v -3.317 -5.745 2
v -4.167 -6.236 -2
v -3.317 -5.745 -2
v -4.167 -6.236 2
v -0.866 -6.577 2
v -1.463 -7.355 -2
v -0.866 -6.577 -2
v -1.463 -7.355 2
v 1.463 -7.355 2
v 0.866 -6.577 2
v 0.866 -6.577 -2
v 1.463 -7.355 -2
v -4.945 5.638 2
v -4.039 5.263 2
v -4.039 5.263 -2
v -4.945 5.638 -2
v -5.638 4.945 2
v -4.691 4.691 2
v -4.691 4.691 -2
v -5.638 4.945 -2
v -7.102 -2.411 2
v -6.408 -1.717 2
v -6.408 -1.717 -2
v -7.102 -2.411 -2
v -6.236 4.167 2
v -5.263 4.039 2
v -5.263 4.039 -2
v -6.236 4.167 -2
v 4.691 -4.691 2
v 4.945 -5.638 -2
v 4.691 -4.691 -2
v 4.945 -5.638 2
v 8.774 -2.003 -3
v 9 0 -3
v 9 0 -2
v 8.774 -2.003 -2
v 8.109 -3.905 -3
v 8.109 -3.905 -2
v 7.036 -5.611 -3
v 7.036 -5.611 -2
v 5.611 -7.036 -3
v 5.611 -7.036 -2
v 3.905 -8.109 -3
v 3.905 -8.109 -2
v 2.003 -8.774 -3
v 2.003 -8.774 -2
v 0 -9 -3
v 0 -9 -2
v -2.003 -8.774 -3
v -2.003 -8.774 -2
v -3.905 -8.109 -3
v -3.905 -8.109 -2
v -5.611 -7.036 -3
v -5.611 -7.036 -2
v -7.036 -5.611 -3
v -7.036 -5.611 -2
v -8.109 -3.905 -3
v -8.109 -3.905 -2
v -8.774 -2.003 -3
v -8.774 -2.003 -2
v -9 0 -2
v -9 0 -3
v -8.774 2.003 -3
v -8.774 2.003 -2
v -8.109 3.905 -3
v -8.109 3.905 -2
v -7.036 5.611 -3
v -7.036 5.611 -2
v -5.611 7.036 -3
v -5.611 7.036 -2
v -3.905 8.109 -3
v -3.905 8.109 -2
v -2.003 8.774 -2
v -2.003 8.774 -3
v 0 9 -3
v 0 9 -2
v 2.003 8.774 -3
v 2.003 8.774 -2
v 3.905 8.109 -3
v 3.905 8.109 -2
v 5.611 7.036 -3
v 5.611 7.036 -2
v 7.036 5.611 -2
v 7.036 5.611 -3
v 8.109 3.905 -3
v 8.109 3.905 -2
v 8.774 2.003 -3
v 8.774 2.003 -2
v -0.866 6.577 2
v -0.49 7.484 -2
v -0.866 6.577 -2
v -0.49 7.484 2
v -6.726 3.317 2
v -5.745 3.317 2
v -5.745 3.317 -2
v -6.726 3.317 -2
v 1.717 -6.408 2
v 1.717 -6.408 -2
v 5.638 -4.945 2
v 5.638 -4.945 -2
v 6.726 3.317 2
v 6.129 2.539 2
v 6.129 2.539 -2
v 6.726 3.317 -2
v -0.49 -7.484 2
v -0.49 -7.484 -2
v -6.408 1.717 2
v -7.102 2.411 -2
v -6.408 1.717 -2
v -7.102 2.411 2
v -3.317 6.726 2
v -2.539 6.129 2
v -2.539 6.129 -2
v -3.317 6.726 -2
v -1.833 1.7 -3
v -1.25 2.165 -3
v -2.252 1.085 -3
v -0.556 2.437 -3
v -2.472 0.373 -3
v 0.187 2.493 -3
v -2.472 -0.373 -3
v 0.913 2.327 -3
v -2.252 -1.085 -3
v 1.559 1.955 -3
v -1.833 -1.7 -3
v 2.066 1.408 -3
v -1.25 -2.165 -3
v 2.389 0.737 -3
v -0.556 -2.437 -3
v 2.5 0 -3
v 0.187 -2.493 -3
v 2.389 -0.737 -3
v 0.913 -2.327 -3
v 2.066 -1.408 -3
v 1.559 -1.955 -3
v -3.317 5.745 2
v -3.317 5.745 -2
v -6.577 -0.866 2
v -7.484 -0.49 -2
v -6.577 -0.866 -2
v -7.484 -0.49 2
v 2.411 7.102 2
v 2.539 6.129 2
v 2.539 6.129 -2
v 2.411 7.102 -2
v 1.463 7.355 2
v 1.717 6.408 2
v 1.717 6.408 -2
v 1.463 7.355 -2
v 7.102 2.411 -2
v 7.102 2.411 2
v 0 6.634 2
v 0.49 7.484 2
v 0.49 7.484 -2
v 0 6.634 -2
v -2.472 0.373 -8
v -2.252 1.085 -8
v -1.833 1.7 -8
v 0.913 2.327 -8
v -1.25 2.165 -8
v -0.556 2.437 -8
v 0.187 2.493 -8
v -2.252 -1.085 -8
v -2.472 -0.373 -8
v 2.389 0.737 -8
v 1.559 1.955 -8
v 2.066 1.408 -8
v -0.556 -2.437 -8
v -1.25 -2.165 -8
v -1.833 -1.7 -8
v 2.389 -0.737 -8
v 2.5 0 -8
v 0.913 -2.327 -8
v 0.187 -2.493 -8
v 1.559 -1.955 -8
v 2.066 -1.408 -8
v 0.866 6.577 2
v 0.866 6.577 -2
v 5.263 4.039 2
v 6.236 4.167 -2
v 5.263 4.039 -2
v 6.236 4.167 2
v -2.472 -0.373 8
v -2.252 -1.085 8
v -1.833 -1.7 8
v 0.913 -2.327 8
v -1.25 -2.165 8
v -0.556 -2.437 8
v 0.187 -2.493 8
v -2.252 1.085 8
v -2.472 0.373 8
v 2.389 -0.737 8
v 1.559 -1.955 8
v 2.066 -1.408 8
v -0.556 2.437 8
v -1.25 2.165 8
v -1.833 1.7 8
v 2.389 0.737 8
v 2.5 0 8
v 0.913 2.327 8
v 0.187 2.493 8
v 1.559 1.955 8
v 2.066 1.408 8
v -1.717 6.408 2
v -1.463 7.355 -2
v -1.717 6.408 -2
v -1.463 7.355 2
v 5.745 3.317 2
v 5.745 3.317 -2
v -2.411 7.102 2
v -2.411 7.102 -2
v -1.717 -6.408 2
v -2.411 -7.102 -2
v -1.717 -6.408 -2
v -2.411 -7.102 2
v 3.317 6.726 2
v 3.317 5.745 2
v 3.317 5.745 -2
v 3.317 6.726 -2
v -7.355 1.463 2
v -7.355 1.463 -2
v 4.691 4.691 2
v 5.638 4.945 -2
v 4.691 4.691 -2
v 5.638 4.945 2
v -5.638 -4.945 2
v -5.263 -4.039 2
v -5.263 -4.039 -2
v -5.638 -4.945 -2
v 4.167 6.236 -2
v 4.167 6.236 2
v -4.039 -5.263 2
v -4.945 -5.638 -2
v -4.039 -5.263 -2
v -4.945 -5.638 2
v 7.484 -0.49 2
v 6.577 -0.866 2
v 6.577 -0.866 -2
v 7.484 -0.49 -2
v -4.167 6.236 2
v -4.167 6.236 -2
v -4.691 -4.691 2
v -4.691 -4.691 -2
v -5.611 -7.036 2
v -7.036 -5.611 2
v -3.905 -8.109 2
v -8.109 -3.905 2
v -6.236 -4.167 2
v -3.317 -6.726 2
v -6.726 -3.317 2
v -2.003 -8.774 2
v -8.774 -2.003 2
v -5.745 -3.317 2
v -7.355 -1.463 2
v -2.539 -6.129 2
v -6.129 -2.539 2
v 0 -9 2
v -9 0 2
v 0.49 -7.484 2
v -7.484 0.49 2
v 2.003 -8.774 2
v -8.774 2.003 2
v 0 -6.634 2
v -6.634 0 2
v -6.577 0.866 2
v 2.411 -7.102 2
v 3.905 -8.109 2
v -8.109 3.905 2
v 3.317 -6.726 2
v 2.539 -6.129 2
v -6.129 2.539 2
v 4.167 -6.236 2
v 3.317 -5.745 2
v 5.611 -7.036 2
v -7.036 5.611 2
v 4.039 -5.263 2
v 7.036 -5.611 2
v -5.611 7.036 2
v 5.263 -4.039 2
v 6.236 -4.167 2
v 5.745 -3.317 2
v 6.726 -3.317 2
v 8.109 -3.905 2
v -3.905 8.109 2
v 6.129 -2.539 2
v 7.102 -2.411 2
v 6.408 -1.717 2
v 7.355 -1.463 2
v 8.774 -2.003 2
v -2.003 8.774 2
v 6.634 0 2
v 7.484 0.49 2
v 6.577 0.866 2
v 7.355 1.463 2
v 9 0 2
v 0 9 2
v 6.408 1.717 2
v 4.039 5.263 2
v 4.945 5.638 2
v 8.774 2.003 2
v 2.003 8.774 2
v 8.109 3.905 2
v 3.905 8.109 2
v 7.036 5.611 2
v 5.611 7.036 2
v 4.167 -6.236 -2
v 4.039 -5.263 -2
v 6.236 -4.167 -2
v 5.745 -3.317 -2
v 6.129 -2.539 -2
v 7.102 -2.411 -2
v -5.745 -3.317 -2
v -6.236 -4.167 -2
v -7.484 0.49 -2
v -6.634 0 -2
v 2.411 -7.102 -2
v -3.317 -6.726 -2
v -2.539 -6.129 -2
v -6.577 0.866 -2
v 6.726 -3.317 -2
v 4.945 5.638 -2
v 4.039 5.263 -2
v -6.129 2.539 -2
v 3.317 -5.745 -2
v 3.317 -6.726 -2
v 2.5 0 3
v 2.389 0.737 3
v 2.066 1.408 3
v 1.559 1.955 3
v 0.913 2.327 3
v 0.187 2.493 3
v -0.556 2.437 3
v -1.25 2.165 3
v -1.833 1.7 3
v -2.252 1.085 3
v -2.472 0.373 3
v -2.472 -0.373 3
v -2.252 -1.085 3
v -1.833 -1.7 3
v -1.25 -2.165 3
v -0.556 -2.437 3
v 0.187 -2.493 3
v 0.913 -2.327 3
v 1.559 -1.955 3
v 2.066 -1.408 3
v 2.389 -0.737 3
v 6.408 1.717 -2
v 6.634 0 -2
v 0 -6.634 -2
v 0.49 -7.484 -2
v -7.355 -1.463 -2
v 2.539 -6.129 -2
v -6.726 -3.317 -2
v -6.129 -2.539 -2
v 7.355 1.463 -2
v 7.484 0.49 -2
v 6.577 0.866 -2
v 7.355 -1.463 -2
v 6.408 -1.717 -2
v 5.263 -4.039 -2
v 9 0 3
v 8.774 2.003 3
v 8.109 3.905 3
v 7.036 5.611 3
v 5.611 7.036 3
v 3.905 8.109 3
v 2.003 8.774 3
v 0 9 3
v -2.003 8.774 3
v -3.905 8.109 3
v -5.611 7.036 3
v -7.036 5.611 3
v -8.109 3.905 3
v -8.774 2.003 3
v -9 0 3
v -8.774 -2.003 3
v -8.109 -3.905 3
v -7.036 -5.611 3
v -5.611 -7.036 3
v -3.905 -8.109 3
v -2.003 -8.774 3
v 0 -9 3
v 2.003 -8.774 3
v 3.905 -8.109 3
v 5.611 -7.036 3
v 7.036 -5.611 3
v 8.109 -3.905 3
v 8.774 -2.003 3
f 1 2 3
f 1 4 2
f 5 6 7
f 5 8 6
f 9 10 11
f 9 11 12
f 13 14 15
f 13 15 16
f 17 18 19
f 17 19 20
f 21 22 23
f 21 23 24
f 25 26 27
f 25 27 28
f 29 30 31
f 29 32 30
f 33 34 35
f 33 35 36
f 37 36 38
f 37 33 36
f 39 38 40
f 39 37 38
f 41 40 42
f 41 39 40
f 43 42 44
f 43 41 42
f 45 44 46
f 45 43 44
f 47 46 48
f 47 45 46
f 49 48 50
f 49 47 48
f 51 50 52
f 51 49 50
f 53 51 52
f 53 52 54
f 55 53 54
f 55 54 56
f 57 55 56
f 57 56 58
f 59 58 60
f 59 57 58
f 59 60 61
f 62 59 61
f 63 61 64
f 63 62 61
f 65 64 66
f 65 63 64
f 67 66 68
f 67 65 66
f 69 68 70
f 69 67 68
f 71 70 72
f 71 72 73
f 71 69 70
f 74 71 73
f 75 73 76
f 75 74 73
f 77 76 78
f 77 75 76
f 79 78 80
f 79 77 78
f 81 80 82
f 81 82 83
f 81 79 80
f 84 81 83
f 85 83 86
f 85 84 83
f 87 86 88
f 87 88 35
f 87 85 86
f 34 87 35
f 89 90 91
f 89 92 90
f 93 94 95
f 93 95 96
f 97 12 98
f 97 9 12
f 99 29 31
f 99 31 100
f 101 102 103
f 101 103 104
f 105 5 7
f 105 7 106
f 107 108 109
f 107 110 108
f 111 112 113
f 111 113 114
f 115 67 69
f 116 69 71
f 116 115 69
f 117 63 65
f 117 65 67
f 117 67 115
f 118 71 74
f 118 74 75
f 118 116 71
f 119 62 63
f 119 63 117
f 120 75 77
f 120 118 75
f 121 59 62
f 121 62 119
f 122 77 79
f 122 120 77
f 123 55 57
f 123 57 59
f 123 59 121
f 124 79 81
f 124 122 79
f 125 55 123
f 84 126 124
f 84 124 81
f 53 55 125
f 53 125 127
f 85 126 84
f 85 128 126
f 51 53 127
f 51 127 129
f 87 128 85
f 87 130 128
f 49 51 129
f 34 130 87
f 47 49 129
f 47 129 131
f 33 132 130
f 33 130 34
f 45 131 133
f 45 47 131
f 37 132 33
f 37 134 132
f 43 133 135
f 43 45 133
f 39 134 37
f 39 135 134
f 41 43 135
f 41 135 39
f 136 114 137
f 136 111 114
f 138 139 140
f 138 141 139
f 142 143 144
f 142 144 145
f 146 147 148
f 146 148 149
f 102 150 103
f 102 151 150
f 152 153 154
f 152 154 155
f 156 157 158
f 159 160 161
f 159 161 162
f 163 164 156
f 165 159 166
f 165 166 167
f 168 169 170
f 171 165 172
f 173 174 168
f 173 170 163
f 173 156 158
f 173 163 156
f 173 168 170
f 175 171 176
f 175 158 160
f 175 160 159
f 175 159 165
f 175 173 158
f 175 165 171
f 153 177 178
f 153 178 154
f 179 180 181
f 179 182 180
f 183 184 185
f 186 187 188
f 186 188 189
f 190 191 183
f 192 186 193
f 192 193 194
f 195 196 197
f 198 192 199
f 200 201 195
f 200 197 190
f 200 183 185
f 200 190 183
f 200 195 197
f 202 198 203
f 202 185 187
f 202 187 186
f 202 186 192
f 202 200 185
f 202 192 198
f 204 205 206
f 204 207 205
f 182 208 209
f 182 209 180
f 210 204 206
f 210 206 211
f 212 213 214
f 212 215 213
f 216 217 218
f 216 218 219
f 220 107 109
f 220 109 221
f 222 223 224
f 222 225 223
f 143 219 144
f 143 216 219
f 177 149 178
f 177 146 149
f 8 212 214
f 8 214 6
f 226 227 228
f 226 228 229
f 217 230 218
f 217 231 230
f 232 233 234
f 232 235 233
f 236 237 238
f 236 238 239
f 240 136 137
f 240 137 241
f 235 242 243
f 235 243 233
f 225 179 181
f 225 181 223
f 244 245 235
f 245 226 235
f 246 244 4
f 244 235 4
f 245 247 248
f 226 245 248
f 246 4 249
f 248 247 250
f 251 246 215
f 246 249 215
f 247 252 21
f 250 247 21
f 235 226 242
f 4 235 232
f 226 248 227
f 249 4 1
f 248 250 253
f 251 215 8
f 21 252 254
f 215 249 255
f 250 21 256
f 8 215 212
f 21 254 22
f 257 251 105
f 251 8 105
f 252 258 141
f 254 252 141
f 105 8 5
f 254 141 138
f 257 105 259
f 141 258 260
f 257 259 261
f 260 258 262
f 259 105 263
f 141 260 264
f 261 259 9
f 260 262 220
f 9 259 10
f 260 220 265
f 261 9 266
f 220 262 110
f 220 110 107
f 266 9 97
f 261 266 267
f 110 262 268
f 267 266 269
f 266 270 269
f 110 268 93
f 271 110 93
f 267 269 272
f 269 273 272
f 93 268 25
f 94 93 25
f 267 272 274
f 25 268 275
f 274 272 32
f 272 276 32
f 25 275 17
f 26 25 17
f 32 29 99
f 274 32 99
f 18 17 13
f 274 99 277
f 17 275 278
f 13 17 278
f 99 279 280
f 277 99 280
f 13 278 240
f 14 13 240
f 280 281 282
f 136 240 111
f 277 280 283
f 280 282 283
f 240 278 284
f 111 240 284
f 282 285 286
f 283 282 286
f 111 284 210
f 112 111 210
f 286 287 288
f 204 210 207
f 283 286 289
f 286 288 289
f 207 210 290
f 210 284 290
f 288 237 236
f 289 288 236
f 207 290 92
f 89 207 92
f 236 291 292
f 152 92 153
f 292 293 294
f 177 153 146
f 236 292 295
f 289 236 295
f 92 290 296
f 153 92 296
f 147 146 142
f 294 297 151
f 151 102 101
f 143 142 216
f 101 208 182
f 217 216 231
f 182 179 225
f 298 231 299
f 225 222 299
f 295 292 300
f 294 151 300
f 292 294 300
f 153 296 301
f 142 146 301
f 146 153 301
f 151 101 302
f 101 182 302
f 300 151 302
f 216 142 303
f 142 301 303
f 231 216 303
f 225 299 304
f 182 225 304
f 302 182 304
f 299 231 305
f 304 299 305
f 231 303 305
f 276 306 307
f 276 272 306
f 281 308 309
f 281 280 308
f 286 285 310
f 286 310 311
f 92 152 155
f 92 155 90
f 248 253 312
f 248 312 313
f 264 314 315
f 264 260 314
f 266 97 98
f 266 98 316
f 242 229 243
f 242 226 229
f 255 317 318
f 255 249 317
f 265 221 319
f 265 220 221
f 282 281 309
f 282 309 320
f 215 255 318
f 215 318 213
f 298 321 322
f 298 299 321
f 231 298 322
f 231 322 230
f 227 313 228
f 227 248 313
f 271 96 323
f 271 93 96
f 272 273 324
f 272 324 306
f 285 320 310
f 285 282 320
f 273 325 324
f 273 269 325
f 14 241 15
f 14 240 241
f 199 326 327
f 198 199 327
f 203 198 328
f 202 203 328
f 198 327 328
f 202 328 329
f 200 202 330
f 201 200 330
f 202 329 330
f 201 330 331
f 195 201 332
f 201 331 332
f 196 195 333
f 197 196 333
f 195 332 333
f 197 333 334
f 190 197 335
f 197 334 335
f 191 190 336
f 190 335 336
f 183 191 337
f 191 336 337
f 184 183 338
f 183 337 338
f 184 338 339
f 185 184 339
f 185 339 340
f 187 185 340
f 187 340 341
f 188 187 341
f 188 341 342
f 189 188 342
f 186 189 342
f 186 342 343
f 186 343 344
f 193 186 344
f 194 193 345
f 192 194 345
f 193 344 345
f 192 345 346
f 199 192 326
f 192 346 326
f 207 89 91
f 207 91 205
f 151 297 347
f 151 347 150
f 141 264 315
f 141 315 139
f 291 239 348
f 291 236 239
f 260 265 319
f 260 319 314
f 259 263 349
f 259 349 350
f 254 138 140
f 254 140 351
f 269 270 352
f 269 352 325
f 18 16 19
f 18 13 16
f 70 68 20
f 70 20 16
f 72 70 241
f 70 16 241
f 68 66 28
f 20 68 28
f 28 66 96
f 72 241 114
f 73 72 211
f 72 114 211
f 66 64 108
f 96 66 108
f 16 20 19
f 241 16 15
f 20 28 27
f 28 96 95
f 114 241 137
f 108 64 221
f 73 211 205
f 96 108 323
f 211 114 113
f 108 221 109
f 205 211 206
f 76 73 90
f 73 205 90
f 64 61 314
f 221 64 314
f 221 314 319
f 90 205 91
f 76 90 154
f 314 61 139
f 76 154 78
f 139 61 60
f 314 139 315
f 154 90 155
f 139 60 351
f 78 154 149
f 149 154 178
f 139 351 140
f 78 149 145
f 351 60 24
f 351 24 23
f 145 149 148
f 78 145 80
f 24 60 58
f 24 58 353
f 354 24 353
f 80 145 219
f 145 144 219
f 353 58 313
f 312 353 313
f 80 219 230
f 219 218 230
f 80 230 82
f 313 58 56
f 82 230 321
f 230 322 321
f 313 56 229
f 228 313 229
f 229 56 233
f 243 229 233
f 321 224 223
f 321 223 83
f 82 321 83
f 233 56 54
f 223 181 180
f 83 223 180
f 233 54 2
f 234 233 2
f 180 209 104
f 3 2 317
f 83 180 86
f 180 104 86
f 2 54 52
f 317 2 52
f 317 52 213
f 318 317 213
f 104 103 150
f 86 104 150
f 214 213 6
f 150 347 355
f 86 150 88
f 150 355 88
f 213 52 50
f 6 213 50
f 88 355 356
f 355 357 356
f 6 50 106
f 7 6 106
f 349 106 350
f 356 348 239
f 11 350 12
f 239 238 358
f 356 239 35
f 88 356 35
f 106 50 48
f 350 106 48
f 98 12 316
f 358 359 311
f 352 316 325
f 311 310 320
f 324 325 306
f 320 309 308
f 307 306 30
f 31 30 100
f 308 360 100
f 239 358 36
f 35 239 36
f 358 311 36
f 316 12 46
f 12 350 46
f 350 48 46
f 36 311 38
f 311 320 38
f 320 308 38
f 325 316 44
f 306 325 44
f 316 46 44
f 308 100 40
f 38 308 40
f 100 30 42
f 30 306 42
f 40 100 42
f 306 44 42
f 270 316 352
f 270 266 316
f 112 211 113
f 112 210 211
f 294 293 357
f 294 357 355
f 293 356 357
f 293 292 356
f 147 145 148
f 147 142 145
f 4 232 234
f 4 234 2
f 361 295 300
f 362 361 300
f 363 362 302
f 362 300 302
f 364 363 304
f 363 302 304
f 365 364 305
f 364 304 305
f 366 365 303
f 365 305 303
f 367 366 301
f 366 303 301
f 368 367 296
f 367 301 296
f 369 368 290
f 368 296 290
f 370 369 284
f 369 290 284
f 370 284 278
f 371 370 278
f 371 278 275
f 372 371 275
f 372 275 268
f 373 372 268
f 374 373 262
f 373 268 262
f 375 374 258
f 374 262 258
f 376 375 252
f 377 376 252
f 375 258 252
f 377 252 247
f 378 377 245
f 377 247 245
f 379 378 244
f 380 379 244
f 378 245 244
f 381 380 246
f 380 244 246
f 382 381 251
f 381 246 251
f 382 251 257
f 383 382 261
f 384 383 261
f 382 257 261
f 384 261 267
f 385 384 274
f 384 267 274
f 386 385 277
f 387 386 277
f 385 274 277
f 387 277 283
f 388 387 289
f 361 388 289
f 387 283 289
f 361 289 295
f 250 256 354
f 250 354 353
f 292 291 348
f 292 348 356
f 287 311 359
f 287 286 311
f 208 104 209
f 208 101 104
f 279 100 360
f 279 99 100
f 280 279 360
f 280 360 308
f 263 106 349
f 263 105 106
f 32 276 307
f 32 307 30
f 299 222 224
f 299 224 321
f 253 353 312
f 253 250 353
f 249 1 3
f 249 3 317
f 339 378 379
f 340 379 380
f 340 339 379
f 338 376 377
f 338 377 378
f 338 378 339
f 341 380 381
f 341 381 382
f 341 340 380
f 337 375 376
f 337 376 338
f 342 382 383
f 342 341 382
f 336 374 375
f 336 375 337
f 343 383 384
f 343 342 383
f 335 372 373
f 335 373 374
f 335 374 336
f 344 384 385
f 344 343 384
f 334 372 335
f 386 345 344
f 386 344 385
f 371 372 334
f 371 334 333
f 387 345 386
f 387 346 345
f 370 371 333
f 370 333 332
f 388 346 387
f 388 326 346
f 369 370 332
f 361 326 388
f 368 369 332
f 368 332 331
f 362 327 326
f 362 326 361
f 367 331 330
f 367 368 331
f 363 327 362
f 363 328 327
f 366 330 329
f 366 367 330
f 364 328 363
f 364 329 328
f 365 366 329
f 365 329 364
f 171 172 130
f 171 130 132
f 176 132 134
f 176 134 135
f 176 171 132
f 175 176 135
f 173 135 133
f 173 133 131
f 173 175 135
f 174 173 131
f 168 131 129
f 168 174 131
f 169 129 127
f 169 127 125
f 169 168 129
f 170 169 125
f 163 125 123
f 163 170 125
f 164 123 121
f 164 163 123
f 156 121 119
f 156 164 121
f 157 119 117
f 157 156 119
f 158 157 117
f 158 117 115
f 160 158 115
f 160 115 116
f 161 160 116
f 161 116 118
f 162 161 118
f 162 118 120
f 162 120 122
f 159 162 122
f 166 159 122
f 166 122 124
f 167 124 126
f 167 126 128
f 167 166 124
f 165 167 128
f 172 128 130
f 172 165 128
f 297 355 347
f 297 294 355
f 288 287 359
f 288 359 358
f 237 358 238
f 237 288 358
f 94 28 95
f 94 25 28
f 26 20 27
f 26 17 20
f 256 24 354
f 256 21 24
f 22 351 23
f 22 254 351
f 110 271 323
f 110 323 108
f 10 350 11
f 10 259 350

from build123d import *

# Parameters (mm, degrees)
SALIENTE_EXTRUIR1_DEPTH      = 2
SALIENTE_EXTRUIR1_DEPTH_BACK = 2
CROQUIS1_R                   = 7.5
CORTAR_EXTRUIR1_DEPTH        = 2.5
MATRIZC1_COUNT               = 48
CROQUIS3_R                   = 9
SALIENTE_EXTRUIR2_DEPTH      = 1
SALIENTE_EXTRUIR3_START      = 1
CROQUIS4_R                   = 9
SALIENTE_EXTRUIR3_DEPTH      = 1
CROQUIS5_R                   = 2.5
SALIENTE_EXTRUIR4_DEPTH      = 5
SALIENTE_EXTRUIR5_START      = 5
CROQUIS6_R                   = 2.5
SALIENTE_EXTRUIR5_DEPTH      = 5


with BuildPart() as part:
    # Croquis1 → Saliente-Extruir1 (new, two sides: drawn at the far end of the back side and taken through both)
    with BuildSketch(Plane.XY.offset(-SALIENTE_EXTRUIR1_DEPTH_BACK)):
        Circle(CROQUIS1_R)
    extrude(amount=SALIENTE_EXTRUIR1_DEPTH + SALIENTE_EXTRUIR1_DEPTH_BACK)

    # Croquis2 → Cortar-Extruir1 (cut, symmetric)
    with BuildSketch(Plane.XY):
        Polygon((-0.5, 7.5), (0.5, 7.5), (0, 6.633974596), align=None)
    cortar_extruir1 = extrude(amount=CORTAR_EXTRUIR1_DEPTH, both=True, mode=Mode.SUBTRACT)

    # MatrizC1: Cortar-Extruir1 ×48 about axis
    matrizc1_axis = Axis((0, 0, -2), (0, 0, 1))
    for i in range(1, MATRIZC1_COUNT):
        add(cortar_extruir1.rotate(matrizc1_axis, i * 360 / MATRIZC1_COUNT), mode=Mode.SUBTRACT)

    # Croquis3 → Saliente-Extruir2 (add)
    with BuildSketch(Plane.XY.offset(2)):
        Circle(CROQUIS3_R)
    extrude(amount=SALIENTE_EXTRUIR2_DEPTH)

    # Croquis4 → Saliente-Extruir3 (add)
    with BuildSketch(Plane(origin=(0, 0, -2), x_dir=(-1, 0, 0), z_dir=(0, 0, -1)).offset(SALIENTE_EXTRUIR3_START)):
        Circle(CROQUIS4_R)
    extrude(amount=-SALIENTE_EXTRUIR3_DEPTH)

    # Croquis5 → Saliente-Extruir4 (add)
    with BuildSketch(Plane.XY.offset(3)):
        Circle(CROQUIS5_R)
    extrude(amount=SALIENTE_EXTRUIR4_DEPTH)

    # Croquis6 → Saliente-Extruir5 (add)
    with BuildSketch(Plane(origin=(0, 0, -3), x_dir=(-1, 0, 0), z_dir=(0, 0, -1)).offset(SALIENTE_EXTRUIR5_START)):
        Circle(CROQUIS6_R)
    extrude(amount=-SALIENTE_EXTRUIR5_DEPTH)


solid = part.part
